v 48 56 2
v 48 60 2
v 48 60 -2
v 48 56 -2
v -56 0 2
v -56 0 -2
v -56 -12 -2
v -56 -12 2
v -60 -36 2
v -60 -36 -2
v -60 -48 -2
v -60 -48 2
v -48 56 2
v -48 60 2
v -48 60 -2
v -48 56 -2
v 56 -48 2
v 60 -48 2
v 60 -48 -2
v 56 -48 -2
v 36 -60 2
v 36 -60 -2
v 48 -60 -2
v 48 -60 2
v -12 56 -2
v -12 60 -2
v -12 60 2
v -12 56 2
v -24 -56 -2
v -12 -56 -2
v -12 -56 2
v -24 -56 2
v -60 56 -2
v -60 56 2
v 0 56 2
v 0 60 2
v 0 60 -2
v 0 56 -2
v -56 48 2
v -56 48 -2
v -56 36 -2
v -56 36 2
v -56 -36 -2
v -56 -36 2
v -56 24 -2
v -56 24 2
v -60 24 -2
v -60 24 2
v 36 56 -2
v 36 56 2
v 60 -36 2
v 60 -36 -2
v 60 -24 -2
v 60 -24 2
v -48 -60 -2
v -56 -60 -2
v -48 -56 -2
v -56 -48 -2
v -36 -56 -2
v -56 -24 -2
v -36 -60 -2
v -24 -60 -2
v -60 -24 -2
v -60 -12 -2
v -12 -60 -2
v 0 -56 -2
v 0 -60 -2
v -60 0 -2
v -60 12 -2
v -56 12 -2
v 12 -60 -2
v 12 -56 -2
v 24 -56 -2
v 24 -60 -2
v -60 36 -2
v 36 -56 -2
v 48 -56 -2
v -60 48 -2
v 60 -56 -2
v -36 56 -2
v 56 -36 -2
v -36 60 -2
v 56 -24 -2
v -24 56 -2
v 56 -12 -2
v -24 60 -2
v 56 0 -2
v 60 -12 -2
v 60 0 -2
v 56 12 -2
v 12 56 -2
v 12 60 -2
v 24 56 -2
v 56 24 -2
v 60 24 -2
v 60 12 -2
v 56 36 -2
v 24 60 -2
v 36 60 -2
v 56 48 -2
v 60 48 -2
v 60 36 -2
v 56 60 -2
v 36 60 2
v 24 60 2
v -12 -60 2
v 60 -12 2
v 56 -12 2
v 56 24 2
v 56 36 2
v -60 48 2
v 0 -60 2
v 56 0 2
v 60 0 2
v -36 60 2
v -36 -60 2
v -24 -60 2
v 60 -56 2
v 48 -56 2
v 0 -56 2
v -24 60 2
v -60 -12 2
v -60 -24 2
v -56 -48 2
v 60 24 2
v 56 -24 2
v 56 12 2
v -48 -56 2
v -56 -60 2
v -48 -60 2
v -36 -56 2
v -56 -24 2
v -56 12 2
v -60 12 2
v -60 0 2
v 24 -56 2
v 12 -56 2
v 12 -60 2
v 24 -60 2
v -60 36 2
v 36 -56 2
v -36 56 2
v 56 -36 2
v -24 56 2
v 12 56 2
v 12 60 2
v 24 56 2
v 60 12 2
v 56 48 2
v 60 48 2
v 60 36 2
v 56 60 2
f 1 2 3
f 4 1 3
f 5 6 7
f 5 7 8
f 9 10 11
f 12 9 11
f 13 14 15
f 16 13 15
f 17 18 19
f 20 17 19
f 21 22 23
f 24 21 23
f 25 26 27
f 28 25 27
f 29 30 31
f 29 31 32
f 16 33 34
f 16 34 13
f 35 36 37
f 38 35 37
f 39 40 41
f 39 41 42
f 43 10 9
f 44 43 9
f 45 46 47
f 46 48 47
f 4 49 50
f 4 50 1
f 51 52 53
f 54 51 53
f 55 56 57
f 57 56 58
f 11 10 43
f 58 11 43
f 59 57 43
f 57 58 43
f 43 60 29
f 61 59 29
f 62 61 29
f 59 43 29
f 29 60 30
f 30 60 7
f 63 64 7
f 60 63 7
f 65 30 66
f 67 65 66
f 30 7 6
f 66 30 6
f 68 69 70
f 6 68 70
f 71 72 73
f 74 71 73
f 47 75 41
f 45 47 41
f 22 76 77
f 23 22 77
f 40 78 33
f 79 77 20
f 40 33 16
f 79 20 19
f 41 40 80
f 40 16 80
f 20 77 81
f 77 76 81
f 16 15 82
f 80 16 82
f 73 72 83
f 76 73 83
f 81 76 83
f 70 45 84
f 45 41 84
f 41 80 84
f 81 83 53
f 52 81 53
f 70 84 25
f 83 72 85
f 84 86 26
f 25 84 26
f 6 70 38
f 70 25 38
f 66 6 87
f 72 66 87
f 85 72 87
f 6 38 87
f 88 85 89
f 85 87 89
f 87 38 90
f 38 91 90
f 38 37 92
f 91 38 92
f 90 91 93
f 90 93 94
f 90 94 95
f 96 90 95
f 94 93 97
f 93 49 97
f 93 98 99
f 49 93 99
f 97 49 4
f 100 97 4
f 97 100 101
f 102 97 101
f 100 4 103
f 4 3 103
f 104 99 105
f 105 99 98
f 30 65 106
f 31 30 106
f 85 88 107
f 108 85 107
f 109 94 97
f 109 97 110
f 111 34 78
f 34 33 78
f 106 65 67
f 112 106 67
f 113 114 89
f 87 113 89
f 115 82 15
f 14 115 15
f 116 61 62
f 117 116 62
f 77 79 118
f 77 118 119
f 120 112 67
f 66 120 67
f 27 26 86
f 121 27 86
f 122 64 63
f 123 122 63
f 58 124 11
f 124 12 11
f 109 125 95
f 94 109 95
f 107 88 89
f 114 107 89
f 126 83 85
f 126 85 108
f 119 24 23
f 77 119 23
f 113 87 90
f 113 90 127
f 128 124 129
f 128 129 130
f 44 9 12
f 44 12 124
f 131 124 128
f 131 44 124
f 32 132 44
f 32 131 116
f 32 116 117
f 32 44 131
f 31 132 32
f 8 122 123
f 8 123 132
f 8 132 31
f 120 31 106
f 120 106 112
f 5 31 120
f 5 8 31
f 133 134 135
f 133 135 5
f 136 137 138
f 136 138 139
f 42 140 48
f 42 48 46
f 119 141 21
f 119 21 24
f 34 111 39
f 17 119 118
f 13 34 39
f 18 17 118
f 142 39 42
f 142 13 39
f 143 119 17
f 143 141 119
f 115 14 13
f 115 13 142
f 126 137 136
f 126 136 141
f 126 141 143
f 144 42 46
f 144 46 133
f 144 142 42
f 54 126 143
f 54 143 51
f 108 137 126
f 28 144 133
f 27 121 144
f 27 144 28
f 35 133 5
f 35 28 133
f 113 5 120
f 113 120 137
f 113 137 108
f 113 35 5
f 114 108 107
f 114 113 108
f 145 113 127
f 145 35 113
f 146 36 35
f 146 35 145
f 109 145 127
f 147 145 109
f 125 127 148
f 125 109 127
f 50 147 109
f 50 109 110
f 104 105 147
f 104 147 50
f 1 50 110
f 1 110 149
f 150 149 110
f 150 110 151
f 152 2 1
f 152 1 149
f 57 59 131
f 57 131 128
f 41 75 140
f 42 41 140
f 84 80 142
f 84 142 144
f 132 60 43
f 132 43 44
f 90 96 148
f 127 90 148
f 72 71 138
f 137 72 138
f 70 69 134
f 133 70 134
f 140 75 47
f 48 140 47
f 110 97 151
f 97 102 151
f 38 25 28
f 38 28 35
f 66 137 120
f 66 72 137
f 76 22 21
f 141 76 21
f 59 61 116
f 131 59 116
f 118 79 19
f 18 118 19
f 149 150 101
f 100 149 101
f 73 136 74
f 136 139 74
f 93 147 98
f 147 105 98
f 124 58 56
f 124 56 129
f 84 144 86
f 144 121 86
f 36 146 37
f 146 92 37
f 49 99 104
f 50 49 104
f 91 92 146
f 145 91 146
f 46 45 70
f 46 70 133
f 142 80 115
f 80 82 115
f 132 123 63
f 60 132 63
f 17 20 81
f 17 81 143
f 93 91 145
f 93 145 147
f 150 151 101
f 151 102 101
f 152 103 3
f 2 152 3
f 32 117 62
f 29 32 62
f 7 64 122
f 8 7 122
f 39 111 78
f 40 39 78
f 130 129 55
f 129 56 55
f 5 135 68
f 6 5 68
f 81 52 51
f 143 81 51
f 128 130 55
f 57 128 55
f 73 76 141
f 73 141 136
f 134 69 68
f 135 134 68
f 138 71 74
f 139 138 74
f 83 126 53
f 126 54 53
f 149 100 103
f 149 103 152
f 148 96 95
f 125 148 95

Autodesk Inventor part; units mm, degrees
ref_plane "YZ Plane" through (0, 0, 0) normal (1, 0, 0) x (0, 1, 0)
ref_plane "XZ Plane" through (0, 0, 0) normal (0, 1, 0) x (-1, 0, 0)
ref_plane "XY Plane" through (0, 0, 0) normal (0, 0, 1) x (1, 0, 0)
sketch "Sketch1" plane through (0, 0, 0) normal (0, 0, 1) x (1, 0, 0)
  line L0 (-60, -60) -> (60, -60)
  line L1 (60, -60) -> (60, 60)
  line L2 (60, 60) -> (-60, 60)
  line L3 (-60, 60) -> (-60, -60)
  line L4 (-30, 60) -> (-24.8931, 60)
  point P0 (0, 0)
  dimension "d0" = 120
  dimension "d1" = 120
  dimension "d2" = 60
  dimension "d3" = 60
extrude "Extrusion1" add sketch "Sketch1" along normal mid plane 4
sketch "Sketch3" plane through (-60, 60, 2) normal (0, 1, 0) x (1, 0, 0)
  line L0 (120, 0) -> (0, 0) projected
  line L1 (0, 4) -> (120, 4) projected
  line L2 (0, 0) -> (12, 0)
  line L3 (12, 0) -> (12, 4)
  line L4 (12, 4) -> (0, 4)
  line L5 (0, 4) -> (0, 0)
  line L6 (0, 4) -> (0, 0) projected
  point P0 (60, 2)
  dimension "d17" = 0
  dimension "d18" = 12
extrude "Extrusion2" cut sketch "Sketch3" against normal blind 4
pattern_linear "side_top" count 5 spacing 24 along (1, 0, 0) of "Extrusion2"
sketch "Sketch4" plane through (-60, 56, -2) normal (-1, 0, 0) x (0, 0, 1)
  line L0 (4, 0) -> (4, -116) projected
  line L1 (0, -116) -> (4, -116)
  line L2 (4, -116) -> (4, -104)
  line L3 (4, -104) -> (0, -104)
  line L4 (0, -104) -> (0, -116)
  line L5 (0, -116) -> (4, -116) projected
  point P0 (2, -56)
  point P1 (4, -112)
  point P2 (4, -104)
  dimension "d49" = 4
  dimension "d50" = 12
  dimension "d51" = 0
  dimension "d52" = 0
extrude "Extrusion3" cut sketch "Sketch4" against normal blind 4
pattern_circular "side_bottom" count 2 over 360 about axis through (0, 0, -10) along (0, 0, 1) of "Extrusion2", "side_top"
pattern_linear "side_left" count 5 spacing 24 along (0, 1, 0) of "Extrusion3"
pattern_circular "side_right" count 2 over 360 about axis through (0, 0, -10) along (0, 0, 1) of "Extrusion3", "side_left"
sketch "Sketch6" plane through (0, 0, 2) normal (0, 0, 1) x (1, 0, 0)
  line L0 (60, -12) -> (60, 0) projected
  line L1 (60, 0) -> (56, 0) projected
  line L2 (56, 0) -> (56, 12) projected
  line L3 (56, 12) -> (60, 12) projected
  line L4 (60, 12) -> (60, 24) projected
  line L5 (60, 24) -> (56, 24) projected
  line L6 (56, 24) -> (56, 36) projected
  line L7 (56, 36) -> (60, 36) projected
  line L8 (60, 36) -> (60, 48) projected
  line L9 (60, 48) -> (56, 48) projected
  line L10 (56, 48) -> (56, 60) projected
  line L11 (56, 60) -> (48, 60) projected
  line L12 (48, 60) -> (48, 56) projected
  line L13 (48, 56) -> (36, 56) projected
  line L14 (36, 56) -> (36, 60) projected
  line L15 (36, 60) -> (24, 60) projected
  line L16 (24, 60) -> (24, 56) projected
  line L17 (24, 56) -> (12, 56) projected
  line L18 (12, 56) -> (12, 60) projected
  line L19 (12, 60) -> (0, 60) projected
  line L20 (0, 60) -> (0, 56) projected
  line L21 (0, 56) -> (-12, 56) projected
  line L22 (-12, 56) -> (-12, 60) projected
  line L23 (-12, 60) -> (-24, 60) projected
  line L24 (-24, 60) -> (-24, 56) projected
  line L25 (-24, 56) -> (-36, 56) projected
  line L26 (-36, 56) -> (-36, 60) projected
  line L27 (-36, 60) -> (-48, 60) projected
  line L28 (-48, 60) -> (-48, 56) projected
  line L29 (-48, 56) -> (-60, 56) projected
  line L30 (-60, 12) -> (-60, 0) projected
  line L31 (-60, 0) -> (-56, 0) projected
  line L32 (-56, 0) -> (-56, -12) projected
  line L33 (-56, -12) -> (-60, -12) projected
  line L34 (-60, -12) -> (-60, -24) projected
  line L35 (-60, -24) -> (-56, -24) projected
  line L36 (-56, -24) -> (-56, -36) projected
  line L37 (-56, -36) -> (-60, -36) projected
  line L38 (-60, -36) -> (-60, -48) projected
  line L39 (-60, -48) -> (-56, -48) projected
  line L40 (-56, -48) -> (-56, -60) projected
  line L41 (-56, -60) -> (-48, -60) projected
  line L42 (-48, -60) -> (-48, -56) projected
  line L43 (-48, -56) -> (-36, -56) projected
  line L44 (-36, -56) -> (-36, -60) projected
  line L45 (-36, -60) -> (-24, -60) projected
  line L46 (-24, -60) -> (-24, -56) projected
  line L47 (-24, -56) -> (-12, -56) projected
  line L48 (-12, -56) -> (-12, -60) projected
  line L49 (-12, -60) -> (0, -60) projected
  line L50 (0, -60) -> (0, -56) projected
  line L51 (0, -56) -> (12, -56) projected
  line L52 (12, -56) -> (12, -60) projected
  line L53 (12, -60) -> (24, -60) projected
  line L54 (24, -60) -> (24, -56) projected
  line L55 (24, -56) -> (36, -56) projected
  line L56 (36, -56) -> (36, -60) projected
  line L57 (36, -60) -> (48, -60) projected
  line L58 (48, -60) -> (48, -56) projected
  line L59 (48, -56) -> (60, -56) projected
  line L60 (-60.11, 60.11) -> (-35.89, 60.11)
  line L61 (-35.89, 60.11) -> (-35.89, 56.11)
  line L62 (-35.89, 56.11) -> (-24.11, 56.11)
  line L63 (-24.11, 56.11) -> (-24.11, 60.11)
  line L64 (-24.11, 60.11) -> (-11.89, 60.11)
  line L65 (-11.89, 60.11) -> (-11.89, 56.11)
  line L66 (-11.89, 56.11) -> (-0.11, 56.11)
  line L67 (-0.11, 56.11) -> (-0.11, 60.11)
  line L68 (-0.11, 60.11) -> (12.11, 60.11)
  line L69 (12.11, 60.11) -> (12.11, 56.11)
  line L70 (12.11, 56.11) -> (23.89, 56.11)
  line L71 (23.89, 56.11) -> (23.89, 60.11)
  line L72 (23.89, 60.11) -> (36.11, 60.11)
  line L73 (36.11, 60.11) -> (36.11, 56.11)
  line L74 (36.11, 56.11) -> (47.89, 56.11)
  line L75 (47.89, 56.11) -> (47.89, 60.11)
  line L76 (47.89, 60.11) -> (56.11, 60.11)
  line L77 (56.11, 60.11) -> (56.11, 48.11)
  line L78 (56.11, 48.11) -> (60.11, 48.11)
  line L79 (60.11, 48.11) -> (60.11, 35.89)
  line L80 (60.11, 35.89) -> (56.11, 35.89)
  line L81 (56.11, 35.89) -> (56.11, 24.11)
  line L82 (56.11, 24.11) -> (60.11, 24.11)
  line L83 (60.11, 24.11) -> (60.11, 11.89)
  line L84 (60.11, 11.89) -> (56.11, 11.89)
  line L85 (56.11, 11.89) -> (56.11, 0.11)
  line L86 (56.11, 0.11) -> (60.11, 0.11)
  line L87 (60.11, 0.11) -> (60.11, -22.11)
  line L88 (60.11, -22.11) -> (56.11, -22.11)
  line L89 (56.11, -22.11) -> (56.11, -33.89)
  line L90 (56.11, -33.89) -> (60.11, -33.89)
  line L91 (60.11, -33.89) -> (60.11, -24.11)
  line L92 (60.11, -24.11) -> (56.11, -24.11)
  line L93 (56.11, -24.11) -> (56.11, -35.89)
  line L94 (56.11, -35.89) -> (60.11, -35.89)
  line L95 (60.11, -35.89) -> (60.11, -68.11)
  line L96 (60.11, -68.11) -> (60.11, -68.11)
  line L97 (60.11, -68.11) -> (60.11, -72.11)
  line L98 (60.11, -72.11) -> (23.89, -72.11)
  line L99 (23.89, -72.11) -> (23.89, -68.11)
  line L100 (23.89, -68.11) -> (36.11, -68.11)
  line L101 (36.11, -68.11) -> (36.11, -72.11)
  line L102 (36.11, -72.11) -> (-0.11, -72.11)
  line L103 (-0.11, -72.11) -> (-0.11, -68.11)
  line L104 (-0.11, -68.11) -> (12.11, -68.11)
  line L105 (12.11, -68.11) -> (12.11, -72.11)
  line L106 (12.11, -72.11) -> (-24.11, -72.11)
  line L107 (-24.11, -72.11) -> (-24.11, -68.11)
  line L108 (-24.11, -68.11) -> (-11.89, -68.11)
  line L109 (-11.89, -68.11) -> (-11.89, -72.11)
  line L110 (-11.89, -72.11) -> (-48.11, -72.11)
  line L111 (-48.11, -72.11) -> (-48.11, -68.11)
  line L112 (-48.11, -68.11) -> (-35.89, -68.11)
  line L113 (-35.89, -68.11) -> (-35.89, -72.11)
  line L114 (-35.89, -72.11) -> (-68.11, -72.11)
  line L115 (-68.11, -72.11) -> (-68.11, -60.11)
  line L116 (-68.11, -60.11) -> (-72.11, -60.11)
  line L117 (-72.11, -60.11) -> (-72.11, -23.89)
  line L118 (-72.11, -23.89) -> (-68.11, -23.89)
  line L119 (-68.11, -23.89) -> (-68.11, -36.11)
  line L120 (-68.11, -36.11) -> (-72.11, -36.11)
  line L121 (-72.11, -36.11) -> (-72.11, 0.11)
  line L122 (-72.11, 0.11) -> (-68.11, 0.11)
  line L123 (-68.11, 0.11) -> (-68.11, -12.11)
  line L124 (-68.11, -12.11) -> (-72.11, -12.11)
  line L125 (-72.11, -12.11) -> (-72.11, 44.11)
  line L126 (-72.11, 44.11) -> (-68.11, 44.11)
  line L127 (-68.11, 44.11) -> (-68.11, 11.89)
  line L128 (-68.11, 11.89) -> (-72.11, 11.89)
  line L129 (-72.11, 11.89) -> (-72.11, 24.11)
  line L130 (-72.11, 24.11) -> (-68.11, 24.11)
  line L131 (-68.11, 24.11) -> (-68.11, 35.89)
  line L132 (-68.11, 35.89) -> (-72.11, 35.89)
  line L133 (-72.11, 35.89) -> (-72.11, 68.11)
  line L134 (-72.11, 68.11) -> (-60.11, 68.11)
  line L135 (-60.11, 68.11) -> (-60.11, 60.11)
  line L136 (56, -36) -> (60, -36) projected
  line L137 (60, -36) -> (60, -24) projected
  line L138 (60, -24) -> (56, -24) projected
  line L139 (56, -24) -> (56, -12) projected
  line L140 (56, -12) -> (60, -12) projected
  line L141 (-60, 56) -> (-60, 48) projected
  line L142 (-60, 48) -> (-56, 48) projected
  line L143 (-56, 48) -> (-56, 36) projected
  line L144 (-56, 36) -> (-60, 36) projected
  line L145 (-60, 36) -> (-60, 24) projected
  line L146 (-60, 24) -> (-56, 24) projected
  line L147 (-56, 24) -> (-56, 12) projected
  line L148 (-56, 12) -> (-60, 12) projected
  line L149 (60, -56) -> (60, -48) projected
  line L150 (60, -48) -> (56, -48) projected
  line L151 (56, -48) -> (56, -36) projected
  point P0 (0, 0)
  dimension "d59" = 0.11
extrude "Extrusion5" [suppressed]
sketch "Sketch7" plane through (0, 0, 2) normal (0, 0, 1) x (1, 0, 0)
  line L0 (-60.11, 68.11) -> (-72.11, 68.11) projected
  line L1 (-72.11, 68.11) -> (-72.11, 35.89) projected
  line L2 (-72.11, 35.89) -> (-68.11, 35.89) projected
  line L3 (-68.11, 35.89) -> (-68.11, 24.11) projected
  line L4 (-68.11, 24.11) -> (-72.11, 24.11) projected
  line L5 (-72.11, 24.11) -> (-72.11, 11.89) projected
  line L6 (-72.11, 11.89) -> (-68.11, 11.89) projected
  line L7 (-68.11, 11.89) -> (-68.11, 0.11) projected
  line L8 (-68.11, 0.11) -> (-72.11, 0.11) projected
  line L9 (-72.11, 0.11) -> (-72.11, -12.11) projected
  line L10 (-72.11, -12.11) -> (-68.11, -12.11) projected
  line L11 (-68.11, -12.11) -> (-68.11, -23.89) projected
  line L12 (-68.11, -23.89) -> (-72.11, -23.89) projected
  line L13 (-72.11, -23.89) -> (-72.11, -36.11) projected
  line L14 (-72.11, -36.11) -> (-68.11, -36.11) projected
  line L15 (-68.11, -36.11) -> (-68.11, -47.89) projected
  line L16 (-68.11, -47.89) -> (-72.11, -47.89) projected
  line L17 (-72.11, -47.89) -> (-72.11, -60.11) projected
  line L18 (-72.11, -60.11) -> (-68.11, -60.11) projected
  line L19 (-68.11, -60.11) -> (-68.11, -72.11) projected
  line L20 (-68.11, -72.11) -> (-35.89, -72.11) projected
  line L21 (-35.89, -72.11) -> (-35.89, -68.11) projected
  line L22 (-35.89, -68.11) -> (-24.11, -68.11) projected
  line L23 (-24.11, -68.11) -> (-24.11, -72.11) projected
  line L24 (-24.11, -72.11) -> (-11.89, -72.11) projected
  line L25 (-11.89, -72.11) -> (-11.89, -68.11) projected
  line L26 (-11.89, -68.11) -> (-0.11, -68.11) projected
  line L27 (-0.11, -68.11) -> (-0.11, -72.11) projected
  line L28 (-0.11, -72.11) -> (12.11, -72.11) projected
  line L29 (12.11, -72.11) -> (12.11, -68.11) projected
  line L30 (12.11, -68.11) -> (23.89, -68.11) projected
  line L31 (23.89, -68.11) -> (23.89, -72.11) projected
  line L32 (23.89, -72.11) -> (36.11, -72.11) projected
  line L33 (36.11, -72.11) -> (36.11, -68.11) projected
  line L34 (36.11, -68.11) -> (47.89, -68.11) projected
  line L35 (47.89, -68.11) -> (47.89, -72.11) projected
  line L36 (47.89, -72.11) -> (60.11, -72.11) projected
  line L37 (60.11, -72.11) -> (60.11, -68.11) projected
  line L38 (60.11, -68.11) -> (72.11, -68.11) projected
  line L39 (72.11, -68.11) -> (72.11, -35.89) projected
  line L40 (72.11, -35.89) -> (68.11, -35.89) projected
  line L41 (68.11, -35.89) -> (68.11, -24.11) projected
  line L42 (68.11, -24.11) -> (72.11, -24.11) projected
  line L43 (72.11, -24.11) -> (72.11, -11.89) projected
  line L44 (72.11, -11.89) -> (68.11, -11.89) projected
  line L45 (68.11, -11.89) -> (68.11, -0.11) projected
  line L46 (68.11, -0.11) -> (72.11, -0.11) projected
  line L47 (72.11, -0.11) -> (72.11, 12.11) projected
  line L48 (72.11, 12.11) -> (68.11, 12.11) projected
  line L49 (68.11, 12.11) -> (68.11, 23.89) projected
  line L50 (68.11, 23.89) -> (72.11, 23.89) projected
  line L51 (72.11, 23.89) -> (72.11, 36.11) projected
  line L52 (72.11, 36.11) -> (68.11, 36.11) projected
  line L53 (68.11, 36.11) -> (68.11, 47.89) projected
  line L54 (68.11, 47.89) -> (72.11, 47.89) projected
  line L55 (72.11, 47.89) -> (72.11, 60.11) projected
  line L56 (72.11, 60.11) -> (68.11, 60.11) projected
  line L57 (68.11, 60.11) -> (68.11, 72.11) projected
  line L58 (68.11, 72.11) -> (35.89, 72.11) projected
  line L59 (35.89, 72.11) -> (35.89, 68.11) projected
  line L60 (35.89, 68.11) -> (24.11, 68.11) projected
  line L61 (24.11, 68.11) -> (24.11, 72.11) projected
  line L62 (24.11, 72.11) -> (11.89, 72.11) projected
  line L63 (11.89, 72.11) -> (11.89, 68.11) projected
  line L64 (11.89, 68.11) -> (0.11, 68.11) projected
  line L65 (0.11, 68.11) -> (0.11, 72.11) projected
  line L66 (0.11, 72.11) -> (-12.11, 72.11) projected
  line L67 (-12.11, 72.11) -> (-12.11, 68.11) projected
  line L68 (-12.11, 68.11) -> (-23.89, 68.11) projected
  line L69 (-23.89, 68.11) -> (-23.89, 72.11) projected
  line L70 (-23.89, 72.11) -> (-36.11, 72.11) projected
  line L71 (-36.11, 72.11) -> (-36.11, 68.11) projected
  line L72 (-36.11, 68.11) -> (-47.89, 68.11) projected
  line L73 (-47.89, 68.11) -> (-47.89, 72.11) projected
  line L74 (-47.89, 72.11) -> (-60.11, 72.11) projected
  line L75 (-60.11, 72.11) -> (-60.11, 68.11) projected
  point P0 (0, 0)
equation "\"d0\" = width"
equation "\"d1\" = height"
equation "\"d2\" = 0.5 * width"
equation "\"d3\" = 0.5 * height"
equation "\"d4\" = thickness"
equation "\"d18\" = finger"
equation "\"d19\" = thickness"
equation "\"d23\" = 2 * finger"
equation "\"d49\" = thickness"
equation "\"d50\" = finger"
equation "\"d28\" = thickness"
equation "\"d55\" = 2 * finger"
equation "\"d59\" = 0.5 * kerf"
equation "\"d60\" = thickness"
equation "\"width\" = 120"
equation "\"height\" = 120"
equation "\"thickness\" = 4"
equation "\"finger\" = 3 * thickness"
equation "\"kerf\" = 0.22"
properties part number "Lukt_hlidarplata"
